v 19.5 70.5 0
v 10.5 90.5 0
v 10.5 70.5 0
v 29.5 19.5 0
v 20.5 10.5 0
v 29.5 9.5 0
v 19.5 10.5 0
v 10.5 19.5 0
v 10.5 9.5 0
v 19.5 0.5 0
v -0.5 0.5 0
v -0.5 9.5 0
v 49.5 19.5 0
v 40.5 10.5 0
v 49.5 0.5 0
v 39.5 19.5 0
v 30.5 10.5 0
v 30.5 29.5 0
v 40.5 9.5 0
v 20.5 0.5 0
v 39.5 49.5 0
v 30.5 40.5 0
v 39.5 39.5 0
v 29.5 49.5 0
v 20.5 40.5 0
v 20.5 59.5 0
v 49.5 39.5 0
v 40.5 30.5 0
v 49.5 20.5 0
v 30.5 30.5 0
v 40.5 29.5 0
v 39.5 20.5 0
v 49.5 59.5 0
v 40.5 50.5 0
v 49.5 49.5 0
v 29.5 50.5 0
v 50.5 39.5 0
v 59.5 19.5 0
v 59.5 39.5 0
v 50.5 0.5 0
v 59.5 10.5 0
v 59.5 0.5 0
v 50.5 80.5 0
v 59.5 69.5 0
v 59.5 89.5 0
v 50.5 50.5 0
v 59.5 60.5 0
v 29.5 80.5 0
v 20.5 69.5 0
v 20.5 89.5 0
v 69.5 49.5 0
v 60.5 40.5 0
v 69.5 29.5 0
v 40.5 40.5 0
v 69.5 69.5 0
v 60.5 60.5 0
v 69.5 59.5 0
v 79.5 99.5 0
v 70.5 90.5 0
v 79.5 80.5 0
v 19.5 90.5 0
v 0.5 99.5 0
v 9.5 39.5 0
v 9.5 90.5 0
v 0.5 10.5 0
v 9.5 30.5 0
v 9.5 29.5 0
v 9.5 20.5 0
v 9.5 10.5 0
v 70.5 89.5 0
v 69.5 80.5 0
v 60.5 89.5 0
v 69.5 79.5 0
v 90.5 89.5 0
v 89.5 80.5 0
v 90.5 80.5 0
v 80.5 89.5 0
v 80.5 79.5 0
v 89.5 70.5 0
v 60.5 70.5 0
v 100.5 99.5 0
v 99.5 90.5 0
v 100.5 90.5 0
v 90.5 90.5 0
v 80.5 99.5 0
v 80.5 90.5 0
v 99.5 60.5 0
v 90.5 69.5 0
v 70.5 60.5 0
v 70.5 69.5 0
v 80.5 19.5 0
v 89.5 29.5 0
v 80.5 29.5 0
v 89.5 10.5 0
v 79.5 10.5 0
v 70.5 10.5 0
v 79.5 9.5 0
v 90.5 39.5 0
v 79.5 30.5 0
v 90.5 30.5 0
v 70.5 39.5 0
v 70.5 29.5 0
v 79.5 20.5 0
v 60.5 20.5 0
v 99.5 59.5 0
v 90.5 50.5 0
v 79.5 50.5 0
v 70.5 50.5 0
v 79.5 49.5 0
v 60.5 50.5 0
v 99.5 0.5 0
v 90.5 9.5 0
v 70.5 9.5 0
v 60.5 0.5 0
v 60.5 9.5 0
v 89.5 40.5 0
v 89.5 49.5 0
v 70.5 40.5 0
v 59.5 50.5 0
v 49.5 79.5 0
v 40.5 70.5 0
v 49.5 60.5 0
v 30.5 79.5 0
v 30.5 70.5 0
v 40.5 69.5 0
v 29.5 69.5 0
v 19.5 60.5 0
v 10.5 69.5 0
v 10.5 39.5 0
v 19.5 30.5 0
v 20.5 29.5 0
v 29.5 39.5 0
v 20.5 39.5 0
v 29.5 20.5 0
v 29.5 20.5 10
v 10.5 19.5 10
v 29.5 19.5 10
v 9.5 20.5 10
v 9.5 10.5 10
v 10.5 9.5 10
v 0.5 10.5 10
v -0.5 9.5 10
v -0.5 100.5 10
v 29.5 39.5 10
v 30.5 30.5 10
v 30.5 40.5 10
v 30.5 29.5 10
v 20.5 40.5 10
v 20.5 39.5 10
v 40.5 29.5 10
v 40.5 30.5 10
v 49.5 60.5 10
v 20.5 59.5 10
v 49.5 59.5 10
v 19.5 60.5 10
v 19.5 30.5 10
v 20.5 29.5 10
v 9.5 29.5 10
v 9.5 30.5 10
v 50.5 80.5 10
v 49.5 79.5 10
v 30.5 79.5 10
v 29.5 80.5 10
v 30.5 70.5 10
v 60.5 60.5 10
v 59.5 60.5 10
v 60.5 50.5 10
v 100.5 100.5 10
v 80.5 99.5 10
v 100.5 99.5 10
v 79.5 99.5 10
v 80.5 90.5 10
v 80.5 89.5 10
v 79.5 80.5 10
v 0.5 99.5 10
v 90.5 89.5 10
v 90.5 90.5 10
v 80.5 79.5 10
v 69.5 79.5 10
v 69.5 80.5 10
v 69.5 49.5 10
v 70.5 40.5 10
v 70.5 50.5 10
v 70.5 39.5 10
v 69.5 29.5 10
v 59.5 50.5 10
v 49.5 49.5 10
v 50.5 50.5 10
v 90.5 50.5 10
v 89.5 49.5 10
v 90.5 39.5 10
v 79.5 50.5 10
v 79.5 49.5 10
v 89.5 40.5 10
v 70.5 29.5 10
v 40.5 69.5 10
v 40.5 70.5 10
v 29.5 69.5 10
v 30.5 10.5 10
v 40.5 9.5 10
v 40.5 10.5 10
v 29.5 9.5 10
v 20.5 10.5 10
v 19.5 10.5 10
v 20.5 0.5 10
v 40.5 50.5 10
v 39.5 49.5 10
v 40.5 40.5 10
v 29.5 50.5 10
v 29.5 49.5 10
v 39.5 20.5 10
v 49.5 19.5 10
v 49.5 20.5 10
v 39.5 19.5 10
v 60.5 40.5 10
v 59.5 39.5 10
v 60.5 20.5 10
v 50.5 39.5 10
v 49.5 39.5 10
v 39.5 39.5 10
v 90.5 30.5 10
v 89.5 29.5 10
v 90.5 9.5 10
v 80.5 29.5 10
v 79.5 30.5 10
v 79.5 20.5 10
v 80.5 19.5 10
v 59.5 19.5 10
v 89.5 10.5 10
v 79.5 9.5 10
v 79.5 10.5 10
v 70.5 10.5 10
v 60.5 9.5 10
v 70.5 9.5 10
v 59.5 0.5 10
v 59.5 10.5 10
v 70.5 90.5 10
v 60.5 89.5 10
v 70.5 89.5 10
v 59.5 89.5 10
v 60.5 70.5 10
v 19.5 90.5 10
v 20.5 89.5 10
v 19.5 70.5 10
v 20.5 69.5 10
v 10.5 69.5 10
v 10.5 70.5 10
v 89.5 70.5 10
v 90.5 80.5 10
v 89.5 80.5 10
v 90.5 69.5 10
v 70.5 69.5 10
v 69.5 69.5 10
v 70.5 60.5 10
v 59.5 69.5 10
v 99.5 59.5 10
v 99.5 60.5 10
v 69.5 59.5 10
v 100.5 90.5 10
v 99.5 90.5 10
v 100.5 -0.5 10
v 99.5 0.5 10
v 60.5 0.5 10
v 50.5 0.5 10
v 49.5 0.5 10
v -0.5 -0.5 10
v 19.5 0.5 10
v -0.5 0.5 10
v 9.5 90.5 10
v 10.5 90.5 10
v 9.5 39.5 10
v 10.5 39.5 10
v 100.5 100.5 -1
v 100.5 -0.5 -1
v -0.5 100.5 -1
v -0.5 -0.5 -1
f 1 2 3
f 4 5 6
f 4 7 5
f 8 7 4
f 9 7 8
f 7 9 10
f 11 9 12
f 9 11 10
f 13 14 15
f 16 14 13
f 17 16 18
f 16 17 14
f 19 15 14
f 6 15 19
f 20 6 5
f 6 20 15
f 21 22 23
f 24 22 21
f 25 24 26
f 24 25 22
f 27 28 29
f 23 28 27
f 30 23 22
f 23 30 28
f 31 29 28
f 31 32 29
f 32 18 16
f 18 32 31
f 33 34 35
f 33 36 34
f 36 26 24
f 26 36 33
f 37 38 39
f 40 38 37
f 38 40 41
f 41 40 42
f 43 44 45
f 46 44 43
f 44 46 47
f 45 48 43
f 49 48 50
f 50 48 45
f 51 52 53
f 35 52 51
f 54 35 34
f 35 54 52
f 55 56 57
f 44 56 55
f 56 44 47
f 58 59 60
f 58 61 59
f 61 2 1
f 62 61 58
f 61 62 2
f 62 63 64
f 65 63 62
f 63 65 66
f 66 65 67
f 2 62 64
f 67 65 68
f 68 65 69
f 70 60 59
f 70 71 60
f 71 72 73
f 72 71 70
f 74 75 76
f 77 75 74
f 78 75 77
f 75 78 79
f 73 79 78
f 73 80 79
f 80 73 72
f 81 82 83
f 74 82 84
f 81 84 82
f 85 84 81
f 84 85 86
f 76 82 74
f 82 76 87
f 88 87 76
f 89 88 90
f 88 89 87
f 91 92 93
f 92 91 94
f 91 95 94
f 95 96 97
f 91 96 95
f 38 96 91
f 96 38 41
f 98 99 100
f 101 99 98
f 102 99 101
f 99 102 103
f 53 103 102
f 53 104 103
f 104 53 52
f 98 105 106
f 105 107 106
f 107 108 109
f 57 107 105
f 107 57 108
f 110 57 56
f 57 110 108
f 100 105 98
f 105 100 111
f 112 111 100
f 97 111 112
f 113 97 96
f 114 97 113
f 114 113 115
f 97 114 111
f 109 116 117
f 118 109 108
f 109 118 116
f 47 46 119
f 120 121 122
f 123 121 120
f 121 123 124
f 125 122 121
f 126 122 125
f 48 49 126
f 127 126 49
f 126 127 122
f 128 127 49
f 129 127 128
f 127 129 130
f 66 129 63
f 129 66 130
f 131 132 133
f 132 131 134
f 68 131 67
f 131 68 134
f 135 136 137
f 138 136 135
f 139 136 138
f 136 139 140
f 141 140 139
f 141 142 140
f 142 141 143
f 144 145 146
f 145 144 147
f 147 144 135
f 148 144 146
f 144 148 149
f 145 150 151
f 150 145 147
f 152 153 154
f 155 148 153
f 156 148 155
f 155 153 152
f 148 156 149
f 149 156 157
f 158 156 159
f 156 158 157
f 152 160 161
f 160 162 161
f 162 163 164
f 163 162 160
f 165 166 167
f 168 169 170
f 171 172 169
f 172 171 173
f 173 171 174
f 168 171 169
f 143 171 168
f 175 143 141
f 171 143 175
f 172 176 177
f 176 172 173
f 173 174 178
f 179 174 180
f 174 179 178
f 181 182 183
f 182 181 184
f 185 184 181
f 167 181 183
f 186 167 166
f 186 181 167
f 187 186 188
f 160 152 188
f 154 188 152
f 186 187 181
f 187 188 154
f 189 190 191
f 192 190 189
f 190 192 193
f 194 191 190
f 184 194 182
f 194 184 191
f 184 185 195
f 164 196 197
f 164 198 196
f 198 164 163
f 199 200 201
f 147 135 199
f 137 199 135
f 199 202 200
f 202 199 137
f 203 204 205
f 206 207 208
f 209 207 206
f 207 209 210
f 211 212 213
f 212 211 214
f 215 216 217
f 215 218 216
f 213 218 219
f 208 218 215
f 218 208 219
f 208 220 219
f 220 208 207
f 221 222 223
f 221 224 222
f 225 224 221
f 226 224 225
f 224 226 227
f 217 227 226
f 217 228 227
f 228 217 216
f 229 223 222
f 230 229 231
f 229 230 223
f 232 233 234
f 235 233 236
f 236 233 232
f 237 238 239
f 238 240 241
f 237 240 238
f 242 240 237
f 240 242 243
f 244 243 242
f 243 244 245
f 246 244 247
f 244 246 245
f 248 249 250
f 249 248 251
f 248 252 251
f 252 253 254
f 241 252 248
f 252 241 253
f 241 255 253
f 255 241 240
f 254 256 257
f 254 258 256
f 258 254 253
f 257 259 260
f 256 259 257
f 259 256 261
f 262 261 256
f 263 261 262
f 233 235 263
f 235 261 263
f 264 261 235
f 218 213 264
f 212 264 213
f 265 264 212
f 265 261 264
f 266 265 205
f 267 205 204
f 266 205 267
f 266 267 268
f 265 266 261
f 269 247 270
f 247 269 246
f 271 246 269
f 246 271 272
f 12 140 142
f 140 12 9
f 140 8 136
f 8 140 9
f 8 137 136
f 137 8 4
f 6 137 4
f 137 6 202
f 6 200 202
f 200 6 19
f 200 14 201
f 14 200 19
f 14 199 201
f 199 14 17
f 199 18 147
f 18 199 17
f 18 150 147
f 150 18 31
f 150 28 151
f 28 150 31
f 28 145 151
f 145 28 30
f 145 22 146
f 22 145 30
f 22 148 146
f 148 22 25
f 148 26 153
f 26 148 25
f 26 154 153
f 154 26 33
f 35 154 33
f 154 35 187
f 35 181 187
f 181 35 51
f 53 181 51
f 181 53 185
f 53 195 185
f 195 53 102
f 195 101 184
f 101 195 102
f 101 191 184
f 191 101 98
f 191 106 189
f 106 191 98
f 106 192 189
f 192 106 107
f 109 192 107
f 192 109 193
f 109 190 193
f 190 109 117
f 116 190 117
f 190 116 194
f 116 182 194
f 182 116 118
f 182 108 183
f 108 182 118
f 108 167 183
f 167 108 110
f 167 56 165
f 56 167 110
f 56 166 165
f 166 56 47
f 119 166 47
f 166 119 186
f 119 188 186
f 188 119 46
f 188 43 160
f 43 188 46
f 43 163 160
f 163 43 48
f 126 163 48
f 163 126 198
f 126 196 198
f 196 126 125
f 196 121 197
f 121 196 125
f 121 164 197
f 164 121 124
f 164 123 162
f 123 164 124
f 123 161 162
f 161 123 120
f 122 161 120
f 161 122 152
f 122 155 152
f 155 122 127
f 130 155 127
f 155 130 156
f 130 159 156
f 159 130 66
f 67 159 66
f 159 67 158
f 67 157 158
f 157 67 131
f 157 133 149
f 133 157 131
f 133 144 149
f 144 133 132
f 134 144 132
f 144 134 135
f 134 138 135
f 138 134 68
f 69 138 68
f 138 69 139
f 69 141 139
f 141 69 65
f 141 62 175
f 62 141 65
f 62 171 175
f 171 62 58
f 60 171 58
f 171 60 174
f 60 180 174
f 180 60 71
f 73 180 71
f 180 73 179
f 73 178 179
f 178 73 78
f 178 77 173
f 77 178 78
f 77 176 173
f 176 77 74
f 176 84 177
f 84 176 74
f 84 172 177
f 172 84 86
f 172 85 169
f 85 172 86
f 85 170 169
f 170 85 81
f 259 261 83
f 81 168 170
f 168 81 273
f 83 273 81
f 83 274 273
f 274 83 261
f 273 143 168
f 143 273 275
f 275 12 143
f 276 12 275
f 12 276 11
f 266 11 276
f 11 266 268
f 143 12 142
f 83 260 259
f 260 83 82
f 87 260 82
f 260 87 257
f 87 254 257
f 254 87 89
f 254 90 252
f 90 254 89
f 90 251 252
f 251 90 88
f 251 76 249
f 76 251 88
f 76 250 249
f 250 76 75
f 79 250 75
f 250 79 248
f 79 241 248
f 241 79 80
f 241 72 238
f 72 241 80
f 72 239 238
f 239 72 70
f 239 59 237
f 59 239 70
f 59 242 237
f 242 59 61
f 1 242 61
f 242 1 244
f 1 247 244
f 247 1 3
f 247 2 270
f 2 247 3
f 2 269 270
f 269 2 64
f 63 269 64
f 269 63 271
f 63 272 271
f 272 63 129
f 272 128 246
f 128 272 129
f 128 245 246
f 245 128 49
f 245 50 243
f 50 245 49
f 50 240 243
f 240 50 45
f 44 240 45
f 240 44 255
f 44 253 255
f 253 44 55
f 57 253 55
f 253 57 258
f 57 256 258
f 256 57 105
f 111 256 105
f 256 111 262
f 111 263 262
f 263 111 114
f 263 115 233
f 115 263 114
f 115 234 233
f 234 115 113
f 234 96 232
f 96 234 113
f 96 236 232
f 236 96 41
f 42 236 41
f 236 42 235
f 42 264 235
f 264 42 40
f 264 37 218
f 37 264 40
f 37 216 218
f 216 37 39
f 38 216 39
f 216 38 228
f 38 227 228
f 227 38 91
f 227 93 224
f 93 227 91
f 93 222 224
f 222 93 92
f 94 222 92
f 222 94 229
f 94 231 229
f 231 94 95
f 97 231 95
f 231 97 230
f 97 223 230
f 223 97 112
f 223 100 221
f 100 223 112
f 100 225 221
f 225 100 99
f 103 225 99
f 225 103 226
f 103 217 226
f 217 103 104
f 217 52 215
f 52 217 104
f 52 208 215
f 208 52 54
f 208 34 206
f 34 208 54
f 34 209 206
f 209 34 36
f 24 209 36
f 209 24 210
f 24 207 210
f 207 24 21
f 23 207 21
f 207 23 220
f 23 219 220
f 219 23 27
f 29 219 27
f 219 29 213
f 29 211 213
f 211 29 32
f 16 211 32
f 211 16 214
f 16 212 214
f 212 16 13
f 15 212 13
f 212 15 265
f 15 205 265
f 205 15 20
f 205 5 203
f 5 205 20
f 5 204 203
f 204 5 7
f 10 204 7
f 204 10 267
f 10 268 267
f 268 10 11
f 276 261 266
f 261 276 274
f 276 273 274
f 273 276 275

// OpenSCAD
rows = 10; 
columns = 10; 
wall_thickness = 1;
wall_height = 10;
block_width = 10;
bottom = "YES";


/*
 * constants, for clearness
 *
 */
 
// random directions, for picking up a direction to visit the next block
function PERMUTATION_OF_FOUR() = [
    [1, 2, 3, 4],
    [1, 2, 4, 3],
    [1, 3, 2, 4],
    [1, 3, 4, 2],
    [1, 4, 2, 3],
    [1, 4, 3, 2],
    [2, 1, 3, 4],
    [2, 1, 4, 3],
    [2, 3, 1, 4],
    [2, 3, 4, 1],
    [2, 4, 1, 3],
    [2, 4, 3, 1],
    [3, 1, 2, 4],
    [3, 1, 4, 2],
    [3, 2, 1, 4],
    [3, 2, 4, 1],
    [3, 4, 1, 2],
    [3, 4, 2, 1],
    [4, 1, 2, 3],
    [4, 1, 3, 2],
    [4, 2, 1, 3],
    [4, 2, 3, 1],
    [4, 3, 1, 2],
    [4, 3, 2, 1]
];

function NO_WALL() = 0;
function UP_WALL() = 1;
function RIGHT_WALL() = 2;
function UP_RIGHT_WALL() = 3;

function NOT_VISITED() = 0;
function VISITED() = 1;

/* 
 * modules for creating a maze
 *
 */

// give a [x, y] point and length. draw a line in the x direction
module x_line(point, length, thickness = 1) {
    offset = thickness / 2;
    translate([point[0] - offset, point[1] - offset, 0]) 
        square([length + thickness, thickness]);
}

// give a [x, y] point and length. draw a line in the y direction
module y_line(point, length, thickness = 1) {
    offset = thickness / 2;
    translate([point[0] - offset, point[1] - offset, 0])  
        square([thickness, length + thickness]);
}

// create the outer wall of maze
module maze_outer_wall(rows, columns, block_width = 5, wall_thickness = 1) {
    x_line([0, rows * block_width], columns * block_width, wall_thickness);
    y_line([0, block_width], (rows - 1) * block_width, wall_thickness);
}

// create the inner wall of maze
module maze_inner_wall(maze, block_width = 5, wall_thickness = 1) {
    for(i = [0:len(maze) - 1]) {
        cord = maze[i];
        x = (cord[0] - 1) * block_width;
        y = (cord[1] - 1) * block_width;
        v = cord[3];
        
        if(v == 1 || v == 3) {
            x_line([x, y], block_width, wall_thickness);
        }
        if(v == 2 || v == 3) {
            y_line([x + block_width, y], block_width, wall_thickness);
        }
    }  
}

// create a maze
module maze(rows, columns, maze_vector, block_width = 5, wall_thickness = 1) {
     maze_outer_wall(rows, columns, block_width, wall_thickness);
     maze_inner_wall(maze_vector, block_width, wall_thickness);
}

/* 
 * utilities functions
 *
 */

// comare the equality of [x1, y1] and [x2, y2]
function cord_equals(cord1, cord2) = cord1 == cord2;

// is the point visited?
function not_visited(cord, vs, index = 0) =
    index == len(vs) ? true : 
        (cord_equals([vs[index][0], vs[index][1]], cord) && vs[index][2] == 1 ? false :
            not_visited(cord, vs, index + 1));
            
// pick a direction randomly
function rand_dirs() =
    PERMUTATION_OF_FOUR()[round(rands(0, 24, 1)[0])]; 

// replace v1 in the vector with v2 
function replace(v1, v2, vs) =
    [for(i = [0:len(vs) - 1]) vs[i] == v1 ? v2 : vs[i]];
    
/* 
 * functions for generating a maze vector
 *
 */

// initialize a maze
function init_maze(rows, columns) = 
    [
	    for(c = [1 : columns]) 
	        for(r = [1 : rows]) 
		        [c, r, 0,  UP_RIGHT_WALL()]
	];
    
// find a vector in the maze vector
function find(i, j, maze_vector, index = 0) =
    index == len(maze_vector) ? [] : (
        cord_equals([i, j], [maze_vector[index][0], maze_vector[index][1]]) ? maze_vector[index] : find(i, j, maze_vector, index + 1)
    );

////
// NO_WALL = 0;
// UP_WALL = 1;
// RIGHT_WALL = 2;
// UP_RIGHT_WALL = 3;
function delete_right_wall(original_block) = 
    original_block == NO_WALL() || original_block == RIGHT_WALL() ? NO_WALL() : UP_WALL();

function delete_up_wall(original_block) = 
    (original_block == NO_WALL() || original_block == UP_WALL()) ? NO_WALL() : RIGHT_WALL();
    
function delete_right_wall_of(vs, is_visited, maze_vector) =
    replace(vs, [vs[0], vs[1] , is_visited, delete_right_wall(vs[3])] ,maze_vector);

function delete_up_wall_of(vs, is_visited, maze_vector) =
    replace(vs, [vs[0], vs[1] , is_visited, delete_up_wall(vs[3])] ,maze_vector);

function go_right(i, j, rows, columns, maze_vector) =
    go_maze(i + 1, j, rows, columns, delete_right_wall_of(find(i, j, maze_vector), VISITED(), maze_vector));
    
function go_up(i, j, rows, columns, maze_vector) =
    go_maze(i, j - 1, rows, columns, delete_up_wall_of(find(i, j, maze_vector), VISITED(), maze_vector));
    
function visit(v, maze_vector) =
    replace(v, [v[0], v[1], VISITED(), v[3]], maze_vector);
 
function go_left(i, j, rows, columns, maze_vector) =
    go_maze(i - 1, j, rows, columns, delete_right_wall_of(find(i - 1, j, maze_vector), NOT_VISITED(), maze_vector));
    
function go_down(i, j, rows, columns, maze_vector) =
    go_maze(i, j + 1, rows, columns, delete_up_wall_of(find(i, j + 1, maze_vector), NOT_VISITED(), maze_vector));
    
function go_maze(i, j, rows, columns, maze_vector) =
    look_around(i, j, rand_dirs(), rows, columns, visit(find(i, j, maze_vector), maze_vector));
    
function look_around(i, j, dirs, rows, columns, maze_vector, index = 0) =
    index == 4 ? maze_vector : 
        look_around( 
            i, j, dirs, 
            rows, columns, 
            build_wall(i, j, dirs[index], rows, columns, maze_vector), 
            index + 1
        ); 

function build_wall(i, j, n, rows, columns, maze_vector) = 
    n == 1 && i != columns && not_visited([i + 1, j], maze_vector) ? go_right(i, j, rows, columns, maze_vector) : ( 
        n == 2 && j != 1 && not_visited([i, j - 1], maze_vector) ? go_up(i, j, rows, columns, maze_vector)  : (
            n == 3 && i != 1 && not_visited([i - 1, j], maze_vector) ? go_left(i, j,rows, columns,  maze_vector)  : (
                n == 4 && j != rows && not_visited([i, j + 1], maze_vector) ? go_down(i, j, rows, columns, maze_vector) : maze_vector
            ) 
        )
    ); 
 
/*
 * create a maze
 *
 */
maze_vector = go_maze(1, 1, rows, columns, replace([columns, rows, 0, UP_RIGHT_WALL()], [columns, rows, 0, UP_WALL()], init_maze(rows, columns)));
linear_extrude(wall_height) 
    maze(rows, columns, maze_vector, block_width, wall_thickness);
	
if(bottom == "YES") {
    translate([-wall_thickness / 2, -wall_thickness / 2, -wall_thickness]) 
	    linear_extrude(wall_thickness) square([block_width * columns + wall_thickness, block_width * rows + wall_thickness]);
}
